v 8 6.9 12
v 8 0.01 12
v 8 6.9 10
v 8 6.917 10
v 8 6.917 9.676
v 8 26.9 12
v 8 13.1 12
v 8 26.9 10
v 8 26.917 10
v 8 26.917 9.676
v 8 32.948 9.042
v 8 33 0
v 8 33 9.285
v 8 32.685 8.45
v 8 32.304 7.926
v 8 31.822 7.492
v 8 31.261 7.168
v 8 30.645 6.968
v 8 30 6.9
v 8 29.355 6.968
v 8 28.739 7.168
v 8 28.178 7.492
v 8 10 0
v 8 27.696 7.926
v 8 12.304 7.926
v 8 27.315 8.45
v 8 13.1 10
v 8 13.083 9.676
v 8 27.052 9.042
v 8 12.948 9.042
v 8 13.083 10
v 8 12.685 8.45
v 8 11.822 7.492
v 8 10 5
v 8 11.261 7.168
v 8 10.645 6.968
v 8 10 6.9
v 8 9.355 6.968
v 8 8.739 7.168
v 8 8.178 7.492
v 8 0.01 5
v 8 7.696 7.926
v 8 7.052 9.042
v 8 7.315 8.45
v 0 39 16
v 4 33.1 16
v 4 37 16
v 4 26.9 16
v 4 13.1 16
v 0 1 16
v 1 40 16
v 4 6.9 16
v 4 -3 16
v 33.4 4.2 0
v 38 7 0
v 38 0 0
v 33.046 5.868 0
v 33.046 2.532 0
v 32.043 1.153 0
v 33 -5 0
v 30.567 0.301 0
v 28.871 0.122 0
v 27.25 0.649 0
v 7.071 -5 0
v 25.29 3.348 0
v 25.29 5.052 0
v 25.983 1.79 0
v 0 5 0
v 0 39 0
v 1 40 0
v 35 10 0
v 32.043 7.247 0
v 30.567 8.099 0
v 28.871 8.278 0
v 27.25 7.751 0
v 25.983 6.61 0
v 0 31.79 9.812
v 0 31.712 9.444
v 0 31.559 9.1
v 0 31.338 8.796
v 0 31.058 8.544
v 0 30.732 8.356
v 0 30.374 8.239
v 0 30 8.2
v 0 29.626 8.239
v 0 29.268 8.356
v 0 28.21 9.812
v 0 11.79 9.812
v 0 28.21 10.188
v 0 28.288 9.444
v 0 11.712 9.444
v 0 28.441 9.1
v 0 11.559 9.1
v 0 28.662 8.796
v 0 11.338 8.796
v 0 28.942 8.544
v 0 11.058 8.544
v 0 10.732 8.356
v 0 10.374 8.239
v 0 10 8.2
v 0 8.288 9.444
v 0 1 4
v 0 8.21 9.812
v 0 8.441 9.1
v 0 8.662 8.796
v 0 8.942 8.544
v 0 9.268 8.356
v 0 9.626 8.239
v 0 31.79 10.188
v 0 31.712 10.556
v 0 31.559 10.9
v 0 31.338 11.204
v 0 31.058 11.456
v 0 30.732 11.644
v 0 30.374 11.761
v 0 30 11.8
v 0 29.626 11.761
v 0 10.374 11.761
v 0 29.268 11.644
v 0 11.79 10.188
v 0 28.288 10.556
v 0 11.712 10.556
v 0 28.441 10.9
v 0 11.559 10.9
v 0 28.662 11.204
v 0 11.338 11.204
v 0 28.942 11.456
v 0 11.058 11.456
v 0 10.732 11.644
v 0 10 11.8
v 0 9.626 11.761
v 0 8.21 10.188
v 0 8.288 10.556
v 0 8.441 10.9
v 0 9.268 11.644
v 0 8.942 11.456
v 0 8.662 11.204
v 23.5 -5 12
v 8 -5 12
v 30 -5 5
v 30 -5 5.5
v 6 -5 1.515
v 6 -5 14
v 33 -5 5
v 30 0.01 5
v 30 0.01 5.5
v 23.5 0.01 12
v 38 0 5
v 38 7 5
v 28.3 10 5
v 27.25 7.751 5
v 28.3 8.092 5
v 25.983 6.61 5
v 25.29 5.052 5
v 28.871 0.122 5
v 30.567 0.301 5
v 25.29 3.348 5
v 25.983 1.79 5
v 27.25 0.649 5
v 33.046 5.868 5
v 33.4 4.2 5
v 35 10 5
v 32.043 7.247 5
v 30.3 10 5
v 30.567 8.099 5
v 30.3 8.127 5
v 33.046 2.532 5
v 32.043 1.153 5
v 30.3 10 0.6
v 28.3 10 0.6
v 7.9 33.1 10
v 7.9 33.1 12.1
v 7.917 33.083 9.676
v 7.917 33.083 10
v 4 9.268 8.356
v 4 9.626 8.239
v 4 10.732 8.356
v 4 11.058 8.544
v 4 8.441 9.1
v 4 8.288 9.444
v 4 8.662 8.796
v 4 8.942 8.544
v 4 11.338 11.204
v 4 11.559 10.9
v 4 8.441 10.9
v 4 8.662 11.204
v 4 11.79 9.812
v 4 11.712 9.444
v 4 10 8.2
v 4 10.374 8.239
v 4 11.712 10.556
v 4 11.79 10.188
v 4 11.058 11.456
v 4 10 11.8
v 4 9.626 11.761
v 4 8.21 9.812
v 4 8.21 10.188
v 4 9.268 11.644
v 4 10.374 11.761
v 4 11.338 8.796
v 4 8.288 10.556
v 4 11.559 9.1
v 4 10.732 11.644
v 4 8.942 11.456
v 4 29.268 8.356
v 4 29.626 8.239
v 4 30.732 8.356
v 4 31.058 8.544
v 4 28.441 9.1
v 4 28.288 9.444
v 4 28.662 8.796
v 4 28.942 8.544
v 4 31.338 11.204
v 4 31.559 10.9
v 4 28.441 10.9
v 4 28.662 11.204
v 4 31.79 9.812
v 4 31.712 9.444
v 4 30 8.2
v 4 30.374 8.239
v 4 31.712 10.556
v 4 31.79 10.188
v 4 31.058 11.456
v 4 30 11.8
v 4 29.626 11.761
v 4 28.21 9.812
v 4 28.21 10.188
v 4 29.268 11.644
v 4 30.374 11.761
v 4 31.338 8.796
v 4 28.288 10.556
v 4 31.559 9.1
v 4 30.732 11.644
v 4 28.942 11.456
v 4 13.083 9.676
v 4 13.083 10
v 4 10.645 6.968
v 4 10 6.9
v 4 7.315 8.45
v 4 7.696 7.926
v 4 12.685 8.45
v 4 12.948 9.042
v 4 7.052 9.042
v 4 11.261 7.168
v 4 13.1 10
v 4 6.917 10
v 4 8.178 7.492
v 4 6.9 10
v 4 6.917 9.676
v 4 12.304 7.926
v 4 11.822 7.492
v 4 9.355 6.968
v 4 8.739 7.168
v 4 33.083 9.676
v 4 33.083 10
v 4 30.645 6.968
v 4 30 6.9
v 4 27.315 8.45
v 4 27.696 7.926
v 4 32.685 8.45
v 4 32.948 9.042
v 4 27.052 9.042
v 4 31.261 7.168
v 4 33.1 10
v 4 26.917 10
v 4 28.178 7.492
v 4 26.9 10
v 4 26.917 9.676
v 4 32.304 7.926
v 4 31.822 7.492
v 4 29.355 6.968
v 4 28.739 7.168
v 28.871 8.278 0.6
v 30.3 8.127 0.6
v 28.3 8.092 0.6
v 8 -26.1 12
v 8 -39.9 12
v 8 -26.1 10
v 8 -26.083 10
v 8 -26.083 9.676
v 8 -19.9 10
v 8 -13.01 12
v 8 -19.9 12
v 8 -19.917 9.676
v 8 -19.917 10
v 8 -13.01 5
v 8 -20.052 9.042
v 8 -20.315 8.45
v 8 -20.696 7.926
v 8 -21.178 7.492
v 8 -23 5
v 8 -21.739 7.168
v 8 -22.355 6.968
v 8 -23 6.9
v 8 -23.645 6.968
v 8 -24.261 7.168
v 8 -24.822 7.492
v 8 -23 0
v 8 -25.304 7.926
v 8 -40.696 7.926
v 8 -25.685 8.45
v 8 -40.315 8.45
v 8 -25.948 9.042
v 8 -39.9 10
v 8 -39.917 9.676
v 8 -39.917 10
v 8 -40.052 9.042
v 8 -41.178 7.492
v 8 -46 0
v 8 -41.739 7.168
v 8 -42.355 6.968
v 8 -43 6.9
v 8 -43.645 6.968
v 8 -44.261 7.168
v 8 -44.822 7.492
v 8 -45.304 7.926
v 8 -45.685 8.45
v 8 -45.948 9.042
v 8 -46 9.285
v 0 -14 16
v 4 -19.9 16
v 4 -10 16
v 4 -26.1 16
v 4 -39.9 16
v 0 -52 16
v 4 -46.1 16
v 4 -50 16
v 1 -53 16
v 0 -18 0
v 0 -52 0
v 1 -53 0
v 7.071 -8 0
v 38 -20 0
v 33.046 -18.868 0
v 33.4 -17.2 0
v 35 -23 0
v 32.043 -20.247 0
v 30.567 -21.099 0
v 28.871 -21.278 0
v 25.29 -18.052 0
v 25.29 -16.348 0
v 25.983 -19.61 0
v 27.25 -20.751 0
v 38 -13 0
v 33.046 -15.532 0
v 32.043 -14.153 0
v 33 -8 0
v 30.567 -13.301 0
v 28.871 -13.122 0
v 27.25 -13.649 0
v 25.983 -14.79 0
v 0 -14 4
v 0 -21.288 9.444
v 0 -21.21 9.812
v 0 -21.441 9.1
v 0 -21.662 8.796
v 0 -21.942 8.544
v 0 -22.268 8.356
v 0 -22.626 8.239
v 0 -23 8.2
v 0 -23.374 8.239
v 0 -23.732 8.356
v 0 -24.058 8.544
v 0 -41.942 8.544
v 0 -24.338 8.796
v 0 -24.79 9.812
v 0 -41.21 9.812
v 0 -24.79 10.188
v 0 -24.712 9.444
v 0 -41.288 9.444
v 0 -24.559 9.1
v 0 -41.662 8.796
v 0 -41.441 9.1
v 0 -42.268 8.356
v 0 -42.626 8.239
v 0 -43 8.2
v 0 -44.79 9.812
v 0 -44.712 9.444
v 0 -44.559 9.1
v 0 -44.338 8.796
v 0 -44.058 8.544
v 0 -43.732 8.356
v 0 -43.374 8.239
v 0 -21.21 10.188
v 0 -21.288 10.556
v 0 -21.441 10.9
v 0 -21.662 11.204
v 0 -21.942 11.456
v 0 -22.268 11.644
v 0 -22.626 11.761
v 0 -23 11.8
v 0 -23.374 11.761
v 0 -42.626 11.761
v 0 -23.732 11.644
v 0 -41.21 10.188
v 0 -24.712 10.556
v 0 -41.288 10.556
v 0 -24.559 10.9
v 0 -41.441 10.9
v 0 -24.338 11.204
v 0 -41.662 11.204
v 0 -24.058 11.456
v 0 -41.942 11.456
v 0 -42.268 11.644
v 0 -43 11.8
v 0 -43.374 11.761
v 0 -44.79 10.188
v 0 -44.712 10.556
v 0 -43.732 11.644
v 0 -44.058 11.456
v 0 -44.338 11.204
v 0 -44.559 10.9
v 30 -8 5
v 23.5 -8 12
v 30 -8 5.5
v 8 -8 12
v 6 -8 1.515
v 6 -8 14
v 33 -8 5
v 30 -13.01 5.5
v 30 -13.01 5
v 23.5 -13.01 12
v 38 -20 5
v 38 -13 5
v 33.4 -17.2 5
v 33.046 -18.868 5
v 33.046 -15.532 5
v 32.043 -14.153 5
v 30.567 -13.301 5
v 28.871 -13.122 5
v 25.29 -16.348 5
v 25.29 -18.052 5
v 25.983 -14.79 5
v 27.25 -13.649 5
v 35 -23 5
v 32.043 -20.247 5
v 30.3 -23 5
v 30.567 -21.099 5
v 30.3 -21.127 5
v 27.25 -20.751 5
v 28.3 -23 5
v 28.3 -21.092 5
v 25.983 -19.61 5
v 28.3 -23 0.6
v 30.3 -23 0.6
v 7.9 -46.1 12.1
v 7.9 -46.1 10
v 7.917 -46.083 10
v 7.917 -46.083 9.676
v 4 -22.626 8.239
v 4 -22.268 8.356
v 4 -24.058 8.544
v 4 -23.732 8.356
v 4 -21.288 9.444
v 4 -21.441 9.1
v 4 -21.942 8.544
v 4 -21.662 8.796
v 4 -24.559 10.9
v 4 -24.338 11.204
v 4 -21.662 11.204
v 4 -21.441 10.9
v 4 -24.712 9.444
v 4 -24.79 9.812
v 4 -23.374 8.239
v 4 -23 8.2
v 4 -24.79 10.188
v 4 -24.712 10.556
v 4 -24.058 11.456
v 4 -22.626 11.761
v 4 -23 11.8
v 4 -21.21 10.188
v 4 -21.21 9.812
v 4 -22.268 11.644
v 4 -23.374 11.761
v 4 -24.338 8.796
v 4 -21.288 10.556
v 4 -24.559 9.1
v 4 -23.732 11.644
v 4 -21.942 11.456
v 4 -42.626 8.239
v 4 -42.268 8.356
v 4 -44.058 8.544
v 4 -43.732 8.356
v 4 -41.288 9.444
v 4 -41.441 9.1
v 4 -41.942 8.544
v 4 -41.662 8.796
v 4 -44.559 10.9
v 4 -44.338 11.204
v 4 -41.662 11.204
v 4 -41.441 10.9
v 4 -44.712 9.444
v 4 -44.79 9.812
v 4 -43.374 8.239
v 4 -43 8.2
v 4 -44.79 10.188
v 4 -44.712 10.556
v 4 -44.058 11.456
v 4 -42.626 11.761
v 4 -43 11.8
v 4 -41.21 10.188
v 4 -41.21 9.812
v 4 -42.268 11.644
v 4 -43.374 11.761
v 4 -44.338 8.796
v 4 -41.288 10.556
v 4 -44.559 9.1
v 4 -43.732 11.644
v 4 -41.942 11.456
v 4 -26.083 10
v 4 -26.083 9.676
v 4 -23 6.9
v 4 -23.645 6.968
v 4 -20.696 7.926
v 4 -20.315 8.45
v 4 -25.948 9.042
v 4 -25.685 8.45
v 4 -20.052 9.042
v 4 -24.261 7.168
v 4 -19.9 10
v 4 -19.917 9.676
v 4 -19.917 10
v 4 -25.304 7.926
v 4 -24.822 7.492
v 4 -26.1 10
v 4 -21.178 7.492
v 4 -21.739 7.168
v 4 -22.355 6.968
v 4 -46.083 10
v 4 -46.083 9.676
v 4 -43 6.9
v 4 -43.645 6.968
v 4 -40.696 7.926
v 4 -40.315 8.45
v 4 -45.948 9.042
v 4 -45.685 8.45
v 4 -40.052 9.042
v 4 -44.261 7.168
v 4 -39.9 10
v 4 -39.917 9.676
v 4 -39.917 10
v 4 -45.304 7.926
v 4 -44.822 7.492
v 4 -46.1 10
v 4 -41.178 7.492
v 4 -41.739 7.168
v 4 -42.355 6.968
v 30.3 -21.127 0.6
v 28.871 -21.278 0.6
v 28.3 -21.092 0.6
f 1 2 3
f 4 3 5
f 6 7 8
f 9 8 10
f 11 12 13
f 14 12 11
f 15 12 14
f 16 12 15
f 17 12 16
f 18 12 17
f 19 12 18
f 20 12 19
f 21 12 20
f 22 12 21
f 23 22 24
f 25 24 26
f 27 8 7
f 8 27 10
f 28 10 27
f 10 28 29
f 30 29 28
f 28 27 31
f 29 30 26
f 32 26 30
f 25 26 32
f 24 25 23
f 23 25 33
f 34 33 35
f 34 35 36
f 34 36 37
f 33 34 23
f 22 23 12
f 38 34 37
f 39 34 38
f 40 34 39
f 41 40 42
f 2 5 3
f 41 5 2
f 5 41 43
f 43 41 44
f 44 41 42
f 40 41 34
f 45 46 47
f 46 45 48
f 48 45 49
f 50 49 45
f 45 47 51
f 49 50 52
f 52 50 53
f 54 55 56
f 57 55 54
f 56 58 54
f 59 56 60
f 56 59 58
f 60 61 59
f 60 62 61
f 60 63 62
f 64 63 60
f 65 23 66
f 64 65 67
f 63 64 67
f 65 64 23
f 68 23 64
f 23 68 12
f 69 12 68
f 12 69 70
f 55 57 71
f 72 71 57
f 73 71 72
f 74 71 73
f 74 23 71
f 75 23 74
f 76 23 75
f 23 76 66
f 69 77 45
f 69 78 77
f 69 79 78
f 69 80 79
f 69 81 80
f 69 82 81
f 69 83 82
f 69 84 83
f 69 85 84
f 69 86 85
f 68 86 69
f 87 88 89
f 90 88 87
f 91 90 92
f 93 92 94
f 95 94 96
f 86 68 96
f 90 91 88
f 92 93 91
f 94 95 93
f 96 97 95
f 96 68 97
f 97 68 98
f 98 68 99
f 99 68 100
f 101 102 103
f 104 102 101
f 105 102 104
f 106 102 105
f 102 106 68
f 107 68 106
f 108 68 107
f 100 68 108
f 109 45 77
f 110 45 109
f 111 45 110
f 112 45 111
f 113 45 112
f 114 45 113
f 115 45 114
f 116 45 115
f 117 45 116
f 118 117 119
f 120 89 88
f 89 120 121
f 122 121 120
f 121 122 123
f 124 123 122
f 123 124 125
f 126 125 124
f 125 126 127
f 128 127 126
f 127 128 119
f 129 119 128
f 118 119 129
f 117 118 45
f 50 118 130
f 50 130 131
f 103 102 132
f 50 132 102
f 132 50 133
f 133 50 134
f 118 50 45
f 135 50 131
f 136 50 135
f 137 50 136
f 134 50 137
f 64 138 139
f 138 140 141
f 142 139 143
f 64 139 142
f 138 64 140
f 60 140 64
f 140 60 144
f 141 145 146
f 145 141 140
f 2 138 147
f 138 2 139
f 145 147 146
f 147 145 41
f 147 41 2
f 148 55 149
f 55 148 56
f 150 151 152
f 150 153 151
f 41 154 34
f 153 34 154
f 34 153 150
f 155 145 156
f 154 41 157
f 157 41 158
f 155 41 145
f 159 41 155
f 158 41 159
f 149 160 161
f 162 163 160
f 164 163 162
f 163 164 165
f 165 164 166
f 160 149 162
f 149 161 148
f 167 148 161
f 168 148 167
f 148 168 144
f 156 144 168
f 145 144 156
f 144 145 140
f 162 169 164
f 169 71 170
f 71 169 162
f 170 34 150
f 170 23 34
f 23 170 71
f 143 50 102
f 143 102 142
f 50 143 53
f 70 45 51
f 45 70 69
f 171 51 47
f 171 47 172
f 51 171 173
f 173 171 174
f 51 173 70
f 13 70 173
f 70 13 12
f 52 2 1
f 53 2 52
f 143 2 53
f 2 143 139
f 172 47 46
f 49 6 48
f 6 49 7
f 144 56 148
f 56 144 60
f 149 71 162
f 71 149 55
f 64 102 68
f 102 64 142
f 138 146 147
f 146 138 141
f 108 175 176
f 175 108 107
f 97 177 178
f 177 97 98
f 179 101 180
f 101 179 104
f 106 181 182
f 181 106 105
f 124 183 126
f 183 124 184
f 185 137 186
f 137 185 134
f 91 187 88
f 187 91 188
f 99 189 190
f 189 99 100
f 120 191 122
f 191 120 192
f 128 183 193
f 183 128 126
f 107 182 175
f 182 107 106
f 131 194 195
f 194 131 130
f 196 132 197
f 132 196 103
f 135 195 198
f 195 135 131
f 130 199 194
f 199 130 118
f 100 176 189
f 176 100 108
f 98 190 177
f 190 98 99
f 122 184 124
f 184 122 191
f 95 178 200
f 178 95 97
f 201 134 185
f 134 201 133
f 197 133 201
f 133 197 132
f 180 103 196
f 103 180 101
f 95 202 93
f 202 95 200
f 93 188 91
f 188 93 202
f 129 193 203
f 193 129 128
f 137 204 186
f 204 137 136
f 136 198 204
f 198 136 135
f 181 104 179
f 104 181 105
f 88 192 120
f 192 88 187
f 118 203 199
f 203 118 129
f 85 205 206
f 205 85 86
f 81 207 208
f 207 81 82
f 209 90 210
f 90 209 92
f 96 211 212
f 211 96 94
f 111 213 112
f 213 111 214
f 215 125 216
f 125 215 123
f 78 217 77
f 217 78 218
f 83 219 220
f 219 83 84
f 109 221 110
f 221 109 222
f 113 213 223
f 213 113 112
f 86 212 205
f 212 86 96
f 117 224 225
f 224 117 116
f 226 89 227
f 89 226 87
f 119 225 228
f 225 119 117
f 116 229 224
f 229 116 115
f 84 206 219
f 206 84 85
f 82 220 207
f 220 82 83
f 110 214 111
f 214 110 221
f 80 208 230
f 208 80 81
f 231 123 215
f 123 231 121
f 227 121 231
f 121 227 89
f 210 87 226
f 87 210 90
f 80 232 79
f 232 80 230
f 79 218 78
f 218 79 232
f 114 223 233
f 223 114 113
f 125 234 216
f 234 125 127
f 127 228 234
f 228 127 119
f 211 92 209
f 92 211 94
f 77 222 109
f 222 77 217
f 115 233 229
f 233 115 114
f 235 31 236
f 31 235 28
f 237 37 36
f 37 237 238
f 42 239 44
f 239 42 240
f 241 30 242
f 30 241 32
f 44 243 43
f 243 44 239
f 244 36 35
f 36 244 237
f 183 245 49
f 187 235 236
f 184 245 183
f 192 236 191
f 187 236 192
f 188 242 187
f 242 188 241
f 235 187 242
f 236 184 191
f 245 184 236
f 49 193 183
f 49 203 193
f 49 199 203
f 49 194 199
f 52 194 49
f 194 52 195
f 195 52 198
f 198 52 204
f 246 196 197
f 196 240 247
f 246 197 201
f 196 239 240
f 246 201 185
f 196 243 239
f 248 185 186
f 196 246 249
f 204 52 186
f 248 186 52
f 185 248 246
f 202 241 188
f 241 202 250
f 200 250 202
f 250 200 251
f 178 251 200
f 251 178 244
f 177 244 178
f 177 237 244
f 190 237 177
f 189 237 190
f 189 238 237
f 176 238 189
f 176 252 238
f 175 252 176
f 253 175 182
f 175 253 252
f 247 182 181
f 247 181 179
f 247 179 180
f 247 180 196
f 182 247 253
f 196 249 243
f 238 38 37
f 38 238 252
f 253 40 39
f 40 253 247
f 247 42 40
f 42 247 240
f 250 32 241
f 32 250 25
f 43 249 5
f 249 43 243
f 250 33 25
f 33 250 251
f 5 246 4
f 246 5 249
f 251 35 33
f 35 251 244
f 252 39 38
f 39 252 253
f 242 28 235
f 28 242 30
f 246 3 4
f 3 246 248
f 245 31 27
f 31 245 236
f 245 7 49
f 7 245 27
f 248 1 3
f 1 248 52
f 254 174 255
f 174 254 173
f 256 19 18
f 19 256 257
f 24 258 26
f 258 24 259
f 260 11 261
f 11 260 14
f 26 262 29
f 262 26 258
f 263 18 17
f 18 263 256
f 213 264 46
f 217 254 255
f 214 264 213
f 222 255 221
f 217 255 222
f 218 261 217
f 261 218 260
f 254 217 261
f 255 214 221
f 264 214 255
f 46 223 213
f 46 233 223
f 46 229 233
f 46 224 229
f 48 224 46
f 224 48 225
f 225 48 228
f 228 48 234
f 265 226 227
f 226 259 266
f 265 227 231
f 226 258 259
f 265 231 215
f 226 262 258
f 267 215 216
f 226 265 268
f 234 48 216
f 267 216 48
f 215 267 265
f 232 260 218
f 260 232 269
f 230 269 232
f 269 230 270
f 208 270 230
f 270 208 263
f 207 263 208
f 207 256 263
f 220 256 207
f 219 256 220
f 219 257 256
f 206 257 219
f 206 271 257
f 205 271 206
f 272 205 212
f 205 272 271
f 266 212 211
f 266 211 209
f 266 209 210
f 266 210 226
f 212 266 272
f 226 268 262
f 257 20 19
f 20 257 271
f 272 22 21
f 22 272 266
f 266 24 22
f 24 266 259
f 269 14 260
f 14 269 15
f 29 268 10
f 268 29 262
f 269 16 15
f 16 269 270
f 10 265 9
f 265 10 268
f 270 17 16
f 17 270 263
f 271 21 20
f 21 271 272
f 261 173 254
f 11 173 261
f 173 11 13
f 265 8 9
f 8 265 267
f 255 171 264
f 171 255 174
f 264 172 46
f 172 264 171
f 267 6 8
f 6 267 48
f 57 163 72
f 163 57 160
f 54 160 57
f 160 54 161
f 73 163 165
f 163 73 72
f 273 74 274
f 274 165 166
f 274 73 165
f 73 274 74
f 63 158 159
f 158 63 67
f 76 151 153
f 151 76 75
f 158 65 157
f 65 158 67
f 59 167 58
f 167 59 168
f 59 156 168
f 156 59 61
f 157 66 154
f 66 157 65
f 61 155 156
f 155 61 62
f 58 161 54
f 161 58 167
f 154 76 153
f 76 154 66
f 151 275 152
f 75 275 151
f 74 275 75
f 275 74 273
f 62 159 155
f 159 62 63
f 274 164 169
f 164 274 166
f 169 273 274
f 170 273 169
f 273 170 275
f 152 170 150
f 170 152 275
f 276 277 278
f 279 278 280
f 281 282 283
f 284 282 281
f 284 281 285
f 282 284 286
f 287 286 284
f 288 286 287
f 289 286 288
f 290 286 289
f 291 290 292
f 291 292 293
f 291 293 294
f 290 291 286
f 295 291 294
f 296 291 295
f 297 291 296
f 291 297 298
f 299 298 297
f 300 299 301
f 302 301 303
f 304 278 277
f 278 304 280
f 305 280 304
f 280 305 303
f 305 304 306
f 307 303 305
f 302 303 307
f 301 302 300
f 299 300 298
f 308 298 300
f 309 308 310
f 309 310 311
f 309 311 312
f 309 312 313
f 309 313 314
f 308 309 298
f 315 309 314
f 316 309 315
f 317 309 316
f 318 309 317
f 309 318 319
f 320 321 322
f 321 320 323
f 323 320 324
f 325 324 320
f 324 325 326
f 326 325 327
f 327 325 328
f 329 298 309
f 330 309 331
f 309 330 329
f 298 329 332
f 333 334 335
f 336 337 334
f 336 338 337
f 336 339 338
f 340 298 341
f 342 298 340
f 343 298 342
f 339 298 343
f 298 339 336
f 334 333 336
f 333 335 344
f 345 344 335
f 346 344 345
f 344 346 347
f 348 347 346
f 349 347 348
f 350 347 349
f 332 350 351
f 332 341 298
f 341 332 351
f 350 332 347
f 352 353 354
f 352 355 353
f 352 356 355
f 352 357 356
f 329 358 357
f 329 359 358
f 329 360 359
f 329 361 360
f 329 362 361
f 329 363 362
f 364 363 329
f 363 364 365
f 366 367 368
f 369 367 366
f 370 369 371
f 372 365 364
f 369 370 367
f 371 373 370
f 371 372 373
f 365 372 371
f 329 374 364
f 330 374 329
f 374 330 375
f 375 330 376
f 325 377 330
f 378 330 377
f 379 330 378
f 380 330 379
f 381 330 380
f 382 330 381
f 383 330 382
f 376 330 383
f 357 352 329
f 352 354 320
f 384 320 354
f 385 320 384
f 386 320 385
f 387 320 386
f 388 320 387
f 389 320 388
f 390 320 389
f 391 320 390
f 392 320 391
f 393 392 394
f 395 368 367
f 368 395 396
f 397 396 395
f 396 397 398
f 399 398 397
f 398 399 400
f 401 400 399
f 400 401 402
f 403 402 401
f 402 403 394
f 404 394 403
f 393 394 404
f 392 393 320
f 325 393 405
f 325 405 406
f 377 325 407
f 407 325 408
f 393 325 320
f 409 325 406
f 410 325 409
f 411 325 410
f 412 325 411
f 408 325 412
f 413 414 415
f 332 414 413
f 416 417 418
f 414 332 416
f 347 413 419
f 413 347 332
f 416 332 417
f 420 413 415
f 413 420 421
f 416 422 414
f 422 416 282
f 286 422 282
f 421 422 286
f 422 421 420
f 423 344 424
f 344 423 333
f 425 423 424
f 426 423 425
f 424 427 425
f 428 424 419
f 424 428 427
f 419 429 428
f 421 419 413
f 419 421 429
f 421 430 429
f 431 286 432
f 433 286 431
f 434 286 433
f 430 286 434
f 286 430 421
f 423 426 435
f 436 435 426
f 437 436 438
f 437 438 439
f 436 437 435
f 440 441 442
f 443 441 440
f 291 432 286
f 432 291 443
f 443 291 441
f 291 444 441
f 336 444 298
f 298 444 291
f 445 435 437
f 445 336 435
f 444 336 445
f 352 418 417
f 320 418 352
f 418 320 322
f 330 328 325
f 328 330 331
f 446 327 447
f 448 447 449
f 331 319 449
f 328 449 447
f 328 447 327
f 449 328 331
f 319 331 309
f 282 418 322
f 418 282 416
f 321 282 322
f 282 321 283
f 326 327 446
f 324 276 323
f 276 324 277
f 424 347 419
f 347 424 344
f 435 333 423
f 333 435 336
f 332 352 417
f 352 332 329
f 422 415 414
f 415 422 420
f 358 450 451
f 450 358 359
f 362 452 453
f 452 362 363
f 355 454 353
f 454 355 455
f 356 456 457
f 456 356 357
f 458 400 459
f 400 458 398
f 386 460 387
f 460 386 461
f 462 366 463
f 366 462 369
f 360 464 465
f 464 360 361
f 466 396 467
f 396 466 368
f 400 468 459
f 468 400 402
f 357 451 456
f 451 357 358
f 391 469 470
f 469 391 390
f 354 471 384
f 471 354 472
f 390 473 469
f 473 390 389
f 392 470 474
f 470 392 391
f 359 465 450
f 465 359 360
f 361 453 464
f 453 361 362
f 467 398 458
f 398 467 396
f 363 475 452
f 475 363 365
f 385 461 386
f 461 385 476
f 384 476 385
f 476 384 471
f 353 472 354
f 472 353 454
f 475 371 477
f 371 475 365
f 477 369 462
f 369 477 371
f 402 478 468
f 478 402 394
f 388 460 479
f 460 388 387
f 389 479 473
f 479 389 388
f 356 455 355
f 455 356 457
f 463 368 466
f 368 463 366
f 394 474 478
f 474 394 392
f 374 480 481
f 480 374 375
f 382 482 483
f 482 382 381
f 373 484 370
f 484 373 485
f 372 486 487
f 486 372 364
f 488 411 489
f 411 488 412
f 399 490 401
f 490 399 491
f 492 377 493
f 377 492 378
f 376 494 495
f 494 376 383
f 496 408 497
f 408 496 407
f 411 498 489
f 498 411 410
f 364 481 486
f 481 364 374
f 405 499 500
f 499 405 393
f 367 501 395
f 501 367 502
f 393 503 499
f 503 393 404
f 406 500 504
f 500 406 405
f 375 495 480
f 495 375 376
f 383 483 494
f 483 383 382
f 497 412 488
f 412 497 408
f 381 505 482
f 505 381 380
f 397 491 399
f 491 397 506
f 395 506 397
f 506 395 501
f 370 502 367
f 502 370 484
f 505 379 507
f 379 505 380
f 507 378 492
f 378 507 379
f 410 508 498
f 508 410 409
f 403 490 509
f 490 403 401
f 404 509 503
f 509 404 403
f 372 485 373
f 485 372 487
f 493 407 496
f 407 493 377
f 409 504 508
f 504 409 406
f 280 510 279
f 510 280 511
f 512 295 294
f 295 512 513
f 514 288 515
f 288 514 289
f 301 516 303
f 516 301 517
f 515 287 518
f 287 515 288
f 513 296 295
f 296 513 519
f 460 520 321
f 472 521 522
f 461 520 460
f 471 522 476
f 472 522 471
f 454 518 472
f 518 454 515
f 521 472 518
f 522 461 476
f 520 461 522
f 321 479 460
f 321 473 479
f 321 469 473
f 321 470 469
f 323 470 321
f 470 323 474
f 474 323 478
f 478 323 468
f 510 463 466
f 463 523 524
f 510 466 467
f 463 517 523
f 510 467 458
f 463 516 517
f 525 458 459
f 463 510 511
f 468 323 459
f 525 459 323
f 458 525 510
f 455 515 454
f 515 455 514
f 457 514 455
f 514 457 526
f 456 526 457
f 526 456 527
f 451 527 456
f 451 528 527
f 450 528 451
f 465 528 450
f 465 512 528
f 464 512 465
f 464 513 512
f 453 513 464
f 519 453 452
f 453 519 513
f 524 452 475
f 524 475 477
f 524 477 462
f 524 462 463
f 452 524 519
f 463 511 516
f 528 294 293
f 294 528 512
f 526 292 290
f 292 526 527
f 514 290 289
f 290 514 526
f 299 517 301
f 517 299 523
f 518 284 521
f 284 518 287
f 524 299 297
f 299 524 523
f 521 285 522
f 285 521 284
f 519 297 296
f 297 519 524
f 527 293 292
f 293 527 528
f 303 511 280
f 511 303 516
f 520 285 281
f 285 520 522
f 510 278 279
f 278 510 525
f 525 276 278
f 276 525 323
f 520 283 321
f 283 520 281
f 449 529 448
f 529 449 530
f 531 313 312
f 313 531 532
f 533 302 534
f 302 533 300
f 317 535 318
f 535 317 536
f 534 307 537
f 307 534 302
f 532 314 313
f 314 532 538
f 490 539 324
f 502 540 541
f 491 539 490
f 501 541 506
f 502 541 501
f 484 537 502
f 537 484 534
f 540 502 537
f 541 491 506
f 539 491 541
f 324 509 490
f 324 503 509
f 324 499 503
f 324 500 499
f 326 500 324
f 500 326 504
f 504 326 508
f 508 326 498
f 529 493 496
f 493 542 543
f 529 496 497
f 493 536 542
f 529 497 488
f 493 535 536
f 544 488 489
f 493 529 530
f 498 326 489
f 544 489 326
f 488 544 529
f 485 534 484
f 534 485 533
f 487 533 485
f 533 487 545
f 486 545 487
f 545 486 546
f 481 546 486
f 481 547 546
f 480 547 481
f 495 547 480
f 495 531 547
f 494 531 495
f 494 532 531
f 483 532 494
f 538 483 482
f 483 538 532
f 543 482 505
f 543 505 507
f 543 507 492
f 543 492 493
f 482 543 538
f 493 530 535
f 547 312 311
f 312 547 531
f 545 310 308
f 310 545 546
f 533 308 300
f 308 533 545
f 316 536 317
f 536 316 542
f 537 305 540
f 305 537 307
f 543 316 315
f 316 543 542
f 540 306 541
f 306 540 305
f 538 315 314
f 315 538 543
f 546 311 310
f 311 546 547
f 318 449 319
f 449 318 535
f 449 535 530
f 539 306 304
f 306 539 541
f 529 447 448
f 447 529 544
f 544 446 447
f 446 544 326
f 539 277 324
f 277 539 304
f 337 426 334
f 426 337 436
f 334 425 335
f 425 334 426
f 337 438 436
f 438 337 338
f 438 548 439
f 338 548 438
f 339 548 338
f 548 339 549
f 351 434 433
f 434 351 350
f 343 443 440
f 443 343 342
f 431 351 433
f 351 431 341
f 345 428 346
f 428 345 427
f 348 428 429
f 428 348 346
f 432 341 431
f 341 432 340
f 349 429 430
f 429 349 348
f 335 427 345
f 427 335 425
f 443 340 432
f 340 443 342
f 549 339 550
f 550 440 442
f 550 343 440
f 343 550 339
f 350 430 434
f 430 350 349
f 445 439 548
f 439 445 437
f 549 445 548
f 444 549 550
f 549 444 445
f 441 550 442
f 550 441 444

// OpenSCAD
// PRUSA iteration3
// Z axis top holder
// GNU GPL v3
// Josef Průša <iam@josefprusa.cz> and contributors
// http://www.reprap.org/wiki/Prusa_Mendel
// http://prusamendel.org

module z_top_base(){
 translate([0,-5,0]) cube([8,45,16]); // plate touching the base
 translate([0,-5,0]) cube([30,5.01,12]); // plate touching the base
 translate([0,-5,0]) cube([38,15,5]); // plate touching the base
}

module z_top_fancy(){
 // Corner cutouts
 translate([0.5,0.5,0]) rotate([0,0,-45-180]) translate([-15,0,-1]) cube([30,30,51]);
 translate([0.5,40-0.5,0]) rotate([0,0,-45+90]) translate([-15,0,-1]) cube([30,30,51]);
 translate([-4,40+5,0]) rotate([0,0,-45-0]) translate([0,0,-1]) cube([30,30,51]);
 translate([8,0,12]) rotate([0,-45,0]) translate([0,-5,0]) cube([30,50,30]);
 translate([38-2.5,-5+2.5,0]) rotate([0,0,-45-90]) translate([-15,0,-1]) cube([30,30,51]);
 translate([38-1.5,10-1.5,0]) rotate([0,0,-45]) translate([-15,0,-1]) cube([30,30,51]);
 translate([0,0,5]) rotate([45+180,0,0]) rotate([0,0,-45+90]) translate([0,0,-15]) cube([30,30,30]);

// Stiffner cut out
 translate([30,0,5.5]) rotate([0,-45,0]) translate([0,-5,0]) cube([30,50,30]);
}

module z_top_holes(){
 // Screw holes
 translate([-1,10,10]) rotate([0,90,0]) cylinder(h = 20, r=1.8, $fn=30);
 translate([-1,10+20,10]) rotate([0,90,0]) cylinder(h = 20, r=1.8, $fn=30);

 // Screw heads
 translate([4,10,10]) rotate([0,90,0]) cylinder(h = 20, r=3.1, $fn=30);
 translate([4,10-3.1,10]) cube([10,6.2,10]);
 translate([4,10+20,10]) rotate([0,90,0]) cylinder(h = 20, r=3.1, $fn=30);
 translate([4,10+20-3.1,10]) cube([10,6.2,10]);

 // Z rod holder
 translate([25+4.3,4.2,-1]) rotate([0,0,0]) cylinder(h = 50, r=4.1, $fn=15);
 translate([25+4.3-1,3,0.6]) cube([2,10,7]); // it's bit up because it helps with printing
}

// Final part
module z_top(){
 difference(){
  z_top_base();
  z_top_fancy();
  z_top_holes();
 }
 translate([0,-13,0]) mirror([0,1,0]) difference(){
  z_top_base();
  z_top_fancy();
  z_top_holes();
 }
}

z_top();
